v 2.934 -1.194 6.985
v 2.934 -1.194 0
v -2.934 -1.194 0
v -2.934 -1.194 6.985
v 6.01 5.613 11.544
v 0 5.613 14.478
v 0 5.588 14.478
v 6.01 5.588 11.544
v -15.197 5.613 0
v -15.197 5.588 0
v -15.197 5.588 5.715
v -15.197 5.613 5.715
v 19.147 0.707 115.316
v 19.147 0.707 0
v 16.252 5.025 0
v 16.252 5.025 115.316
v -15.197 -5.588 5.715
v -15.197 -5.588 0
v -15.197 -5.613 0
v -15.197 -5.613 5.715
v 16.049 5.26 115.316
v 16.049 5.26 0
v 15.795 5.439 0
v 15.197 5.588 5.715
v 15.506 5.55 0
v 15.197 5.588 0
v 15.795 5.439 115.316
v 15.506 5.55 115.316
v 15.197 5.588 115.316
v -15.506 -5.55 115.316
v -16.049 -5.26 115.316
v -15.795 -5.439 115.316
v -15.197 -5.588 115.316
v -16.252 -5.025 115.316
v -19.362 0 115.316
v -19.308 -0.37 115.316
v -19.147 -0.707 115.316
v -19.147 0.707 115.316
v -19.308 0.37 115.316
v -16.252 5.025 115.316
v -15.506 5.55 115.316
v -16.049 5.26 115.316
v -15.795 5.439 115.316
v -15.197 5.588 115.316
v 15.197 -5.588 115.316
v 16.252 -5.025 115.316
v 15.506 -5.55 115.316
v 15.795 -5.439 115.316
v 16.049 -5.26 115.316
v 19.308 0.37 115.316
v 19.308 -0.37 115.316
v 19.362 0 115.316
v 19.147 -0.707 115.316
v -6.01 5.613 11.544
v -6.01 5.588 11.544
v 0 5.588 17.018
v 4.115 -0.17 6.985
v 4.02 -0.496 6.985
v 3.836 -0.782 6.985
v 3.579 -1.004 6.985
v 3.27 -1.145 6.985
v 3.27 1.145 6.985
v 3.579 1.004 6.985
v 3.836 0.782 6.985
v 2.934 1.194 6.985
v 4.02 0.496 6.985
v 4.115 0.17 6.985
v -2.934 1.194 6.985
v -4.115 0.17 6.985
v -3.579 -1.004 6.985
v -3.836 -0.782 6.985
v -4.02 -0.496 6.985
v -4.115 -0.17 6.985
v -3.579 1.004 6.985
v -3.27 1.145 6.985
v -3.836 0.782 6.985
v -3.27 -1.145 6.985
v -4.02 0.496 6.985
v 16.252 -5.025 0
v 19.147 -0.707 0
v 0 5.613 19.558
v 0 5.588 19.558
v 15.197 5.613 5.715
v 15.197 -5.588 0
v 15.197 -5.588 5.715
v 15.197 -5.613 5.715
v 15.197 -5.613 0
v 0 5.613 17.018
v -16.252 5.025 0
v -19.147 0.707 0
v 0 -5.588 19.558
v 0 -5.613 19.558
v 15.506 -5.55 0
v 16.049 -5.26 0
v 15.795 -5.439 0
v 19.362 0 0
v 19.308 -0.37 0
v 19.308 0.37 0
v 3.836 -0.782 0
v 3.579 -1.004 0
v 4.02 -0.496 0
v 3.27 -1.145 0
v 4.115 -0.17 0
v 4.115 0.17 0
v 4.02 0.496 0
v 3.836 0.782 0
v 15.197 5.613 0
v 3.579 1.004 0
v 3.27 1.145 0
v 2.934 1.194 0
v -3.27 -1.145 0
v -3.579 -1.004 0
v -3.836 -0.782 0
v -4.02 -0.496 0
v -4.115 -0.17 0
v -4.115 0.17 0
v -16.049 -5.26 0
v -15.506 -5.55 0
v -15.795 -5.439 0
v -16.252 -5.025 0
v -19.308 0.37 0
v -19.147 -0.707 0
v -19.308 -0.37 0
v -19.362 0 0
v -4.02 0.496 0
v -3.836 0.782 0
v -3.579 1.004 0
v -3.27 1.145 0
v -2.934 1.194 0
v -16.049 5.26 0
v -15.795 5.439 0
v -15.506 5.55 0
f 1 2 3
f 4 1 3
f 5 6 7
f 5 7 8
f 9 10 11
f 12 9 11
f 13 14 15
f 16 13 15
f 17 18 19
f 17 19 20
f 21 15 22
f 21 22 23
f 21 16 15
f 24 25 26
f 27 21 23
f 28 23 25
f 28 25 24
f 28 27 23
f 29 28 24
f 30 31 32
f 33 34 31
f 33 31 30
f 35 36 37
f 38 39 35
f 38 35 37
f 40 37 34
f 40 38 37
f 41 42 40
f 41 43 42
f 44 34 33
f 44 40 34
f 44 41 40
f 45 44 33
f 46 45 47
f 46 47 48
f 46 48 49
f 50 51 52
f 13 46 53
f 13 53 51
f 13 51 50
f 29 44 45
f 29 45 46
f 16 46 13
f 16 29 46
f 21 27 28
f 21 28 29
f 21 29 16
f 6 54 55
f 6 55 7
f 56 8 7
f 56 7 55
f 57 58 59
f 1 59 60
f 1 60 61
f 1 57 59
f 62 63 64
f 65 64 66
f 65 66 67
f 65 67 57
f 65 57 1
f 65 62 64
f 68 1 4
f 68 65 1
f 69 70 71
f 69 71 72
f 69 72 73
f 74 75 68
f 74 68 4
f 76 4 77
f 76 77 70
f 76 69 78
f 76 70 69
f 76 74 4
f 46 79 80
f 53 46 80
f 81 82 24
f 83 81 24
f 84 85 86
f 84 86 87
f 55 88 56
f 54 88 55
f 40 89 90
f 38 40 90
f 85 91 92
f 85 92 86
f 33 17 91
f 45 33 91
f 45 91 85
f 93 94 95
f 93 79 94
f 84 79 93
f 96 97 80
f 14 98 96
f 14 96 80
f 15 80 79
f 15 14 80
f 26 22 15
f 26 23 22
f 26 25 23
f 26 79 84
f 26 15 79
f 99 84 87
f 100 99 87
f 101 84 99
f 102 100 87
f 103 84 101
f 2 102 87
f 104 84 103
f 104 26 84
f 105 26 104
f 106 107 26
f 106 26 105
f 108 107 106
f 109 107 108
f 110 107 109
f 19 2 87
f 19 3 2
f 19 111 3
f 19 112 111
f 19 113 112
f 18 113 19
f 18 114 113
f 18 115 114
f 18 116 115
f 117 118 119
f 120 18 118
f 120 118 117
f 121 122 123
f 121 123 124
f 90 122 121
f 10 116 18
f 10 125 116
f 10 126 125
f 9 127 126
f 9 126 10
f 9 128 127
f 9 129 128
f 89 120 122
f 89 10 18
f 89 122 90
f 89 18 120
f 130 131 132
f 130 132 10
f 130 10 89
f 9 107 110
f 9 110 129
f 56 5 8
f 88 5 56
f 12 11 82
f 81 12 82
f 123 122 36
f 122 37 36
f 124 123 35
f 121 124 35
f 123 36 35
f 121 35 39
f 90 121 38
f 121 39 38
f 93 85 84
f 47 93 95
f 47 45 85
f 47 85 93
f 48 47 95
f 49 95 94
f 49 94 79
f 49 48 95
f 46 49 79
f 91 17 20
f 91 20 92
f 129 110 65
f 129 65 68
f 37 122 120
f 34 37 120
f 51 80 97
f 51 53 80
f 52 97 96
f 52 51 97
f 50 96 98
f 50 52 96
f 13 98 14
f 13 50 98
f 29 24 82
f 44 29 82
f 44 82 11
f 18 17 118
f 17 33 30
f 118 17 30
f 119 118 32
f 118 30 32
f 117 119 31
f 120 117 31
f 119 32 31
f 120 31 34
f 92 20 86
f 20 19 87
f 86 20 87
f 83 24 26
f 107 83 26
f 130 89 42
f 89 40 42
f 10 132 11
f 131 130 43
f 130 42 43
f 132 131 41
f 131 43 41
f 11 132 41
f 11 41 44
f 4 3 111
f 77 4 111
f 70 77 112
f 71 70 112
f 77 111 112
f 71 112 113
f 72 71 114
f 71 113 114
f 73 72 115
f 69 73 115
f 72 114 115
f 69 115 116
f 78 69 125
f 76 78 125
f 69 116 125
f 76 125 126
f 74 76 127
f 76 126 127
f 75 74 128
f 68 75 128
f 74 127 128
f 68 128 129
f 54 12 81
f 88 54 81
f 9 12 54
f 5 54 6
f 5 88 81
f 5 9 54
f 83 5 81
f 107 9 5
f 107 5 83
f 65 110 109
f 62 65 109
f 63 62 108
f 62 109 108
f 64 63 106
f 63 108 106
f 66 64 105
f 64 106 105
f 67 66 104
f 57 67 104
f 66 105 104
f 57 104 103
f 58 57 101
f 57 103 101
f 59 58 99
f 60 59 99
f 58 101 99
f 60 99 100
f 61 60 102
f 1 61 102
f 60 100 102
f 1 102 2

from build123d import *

# Parameters (mm, degrees)
BOSS_EXTRUDE1_DEPTH = 115.316
SKETCH2_R           = 1.1938
CUT_EXTRUDE1_DEPTH  = 6.985
SKETCH2_4_R         = 1.1938
CUT_EXTRUDE2_DEPTH  = 6.985
SKETCH2_5_W         = 5.8674
SKETCH2_5_H         = 2.3876
CUT_EXTRUDE3_DEPTH  = 6.985
FILLET1_R           = 1.27
BOSS_EXTRUDE2_DEPTH = 0.0254
CUT_EXTRUDE5_DEPTH  = 0.0254


with BuildPart() as part:
    # Sketch1 → Boss-Extrude1 (new body)
    with BuildSketch(Plane.XY):
        Polygon((-15.875, -5.588), (15.875, -5.588), (19.6215, 0), (15.875, 5.588), (-15.875, 5.588), (-19.6215, 0), align=None)
    extrude(amount=BOSS_EXTRUDE1_DEPTH)

    # Sketch2 → Cut-Extrude1 (cut)
    with BuildSketch(Plane(origin=(0, 0, 0), x_dir=(-1, 0, 0), z_dir=(0, 0, -1))):
        with Locations((-2.9337, 0)):
            Circle(SKETCH2_R)
    extrude(amount=-CUT_EXTRUDE1_DEPTH, mode=Mode.SUBTRACT)

    # Sketch2<4> → Cut-Extrude2 (cut)
    with BuildSketch(Plane(origin=(0, 0, 0), x_dir=(-1, 0, 0), z_dir=(0, 0, -1))):
        with Locations((2.9337, 0)):
            Circle(SKETCH2_4_R)
    extrude(amount=-CUT_EXTRUDE2_DEPTH, mode=Mode.SUBTRACT)

    # Sketch2<5> → Cut-Extrude3 (cut)
    with BuildSketch(Plane(origin=(0, 0, 0), x_dir=(-1, 0, 0), z_dir=(0, 0, -1))):
        Rectangle(SKETCH2_5_W, SKETCH2_5_H)
    extrude(amount=-CUT_EXTRUDE3_DEPTH, mode=Mode.SUBTRACT)

    # Fillet1
    fillet1_edges = [part.edges().sort_by_distance(p)[0] for p in [
        (15.875, 5.588, 57.658),
        (19.6215, 0, 57.658),
        (15.875, -5.588, 57.658),
        (-15.875, -5.588, 57.658),
        (-19.6215, 0, 57.658),
        (-15.875, 5.588, 57.658),
    ]]
    fillet(fillet1_edges, radius=FILLET1_R)

    # Sketch4 → Boss-Extrude2 (add)
    with BuildSketch(Plane(origin=(0, 5.588, 0), x_dir=(1, 0, 0), z_dir=(0, 1, 0))):
        Polygon((15.19745355, 0), (-15.19745355, 0), (-15.19745355, -5.715), (0, -19.558), (15.19745355, -5.715), align=None)
    boss_extrude2 = extrude(amount=BOSS_EXTRUDE2_DEPTH)

    # Mirror1: Boss-Extrude2 across plane
    add(boss_extrude2.mirror(Plane.ZX))

    # Sketch6 → Cut-Extrude5 (cut)
    with BuildSketch(Plane(origin=(0, 5.6134, 0), x_dir=(1, 0, 0), z_dir=(0, 1, 0))):
        Polygon((0, -17.018), (-6.009529828, -11.544061808), (0, -14.478), (6.009529828, -11.544061808), align=None)
    extrude(amount=-CUT_EXTRUDE5_DEPTH, mode=Mode.SUBTRACT)


solid = part.part
